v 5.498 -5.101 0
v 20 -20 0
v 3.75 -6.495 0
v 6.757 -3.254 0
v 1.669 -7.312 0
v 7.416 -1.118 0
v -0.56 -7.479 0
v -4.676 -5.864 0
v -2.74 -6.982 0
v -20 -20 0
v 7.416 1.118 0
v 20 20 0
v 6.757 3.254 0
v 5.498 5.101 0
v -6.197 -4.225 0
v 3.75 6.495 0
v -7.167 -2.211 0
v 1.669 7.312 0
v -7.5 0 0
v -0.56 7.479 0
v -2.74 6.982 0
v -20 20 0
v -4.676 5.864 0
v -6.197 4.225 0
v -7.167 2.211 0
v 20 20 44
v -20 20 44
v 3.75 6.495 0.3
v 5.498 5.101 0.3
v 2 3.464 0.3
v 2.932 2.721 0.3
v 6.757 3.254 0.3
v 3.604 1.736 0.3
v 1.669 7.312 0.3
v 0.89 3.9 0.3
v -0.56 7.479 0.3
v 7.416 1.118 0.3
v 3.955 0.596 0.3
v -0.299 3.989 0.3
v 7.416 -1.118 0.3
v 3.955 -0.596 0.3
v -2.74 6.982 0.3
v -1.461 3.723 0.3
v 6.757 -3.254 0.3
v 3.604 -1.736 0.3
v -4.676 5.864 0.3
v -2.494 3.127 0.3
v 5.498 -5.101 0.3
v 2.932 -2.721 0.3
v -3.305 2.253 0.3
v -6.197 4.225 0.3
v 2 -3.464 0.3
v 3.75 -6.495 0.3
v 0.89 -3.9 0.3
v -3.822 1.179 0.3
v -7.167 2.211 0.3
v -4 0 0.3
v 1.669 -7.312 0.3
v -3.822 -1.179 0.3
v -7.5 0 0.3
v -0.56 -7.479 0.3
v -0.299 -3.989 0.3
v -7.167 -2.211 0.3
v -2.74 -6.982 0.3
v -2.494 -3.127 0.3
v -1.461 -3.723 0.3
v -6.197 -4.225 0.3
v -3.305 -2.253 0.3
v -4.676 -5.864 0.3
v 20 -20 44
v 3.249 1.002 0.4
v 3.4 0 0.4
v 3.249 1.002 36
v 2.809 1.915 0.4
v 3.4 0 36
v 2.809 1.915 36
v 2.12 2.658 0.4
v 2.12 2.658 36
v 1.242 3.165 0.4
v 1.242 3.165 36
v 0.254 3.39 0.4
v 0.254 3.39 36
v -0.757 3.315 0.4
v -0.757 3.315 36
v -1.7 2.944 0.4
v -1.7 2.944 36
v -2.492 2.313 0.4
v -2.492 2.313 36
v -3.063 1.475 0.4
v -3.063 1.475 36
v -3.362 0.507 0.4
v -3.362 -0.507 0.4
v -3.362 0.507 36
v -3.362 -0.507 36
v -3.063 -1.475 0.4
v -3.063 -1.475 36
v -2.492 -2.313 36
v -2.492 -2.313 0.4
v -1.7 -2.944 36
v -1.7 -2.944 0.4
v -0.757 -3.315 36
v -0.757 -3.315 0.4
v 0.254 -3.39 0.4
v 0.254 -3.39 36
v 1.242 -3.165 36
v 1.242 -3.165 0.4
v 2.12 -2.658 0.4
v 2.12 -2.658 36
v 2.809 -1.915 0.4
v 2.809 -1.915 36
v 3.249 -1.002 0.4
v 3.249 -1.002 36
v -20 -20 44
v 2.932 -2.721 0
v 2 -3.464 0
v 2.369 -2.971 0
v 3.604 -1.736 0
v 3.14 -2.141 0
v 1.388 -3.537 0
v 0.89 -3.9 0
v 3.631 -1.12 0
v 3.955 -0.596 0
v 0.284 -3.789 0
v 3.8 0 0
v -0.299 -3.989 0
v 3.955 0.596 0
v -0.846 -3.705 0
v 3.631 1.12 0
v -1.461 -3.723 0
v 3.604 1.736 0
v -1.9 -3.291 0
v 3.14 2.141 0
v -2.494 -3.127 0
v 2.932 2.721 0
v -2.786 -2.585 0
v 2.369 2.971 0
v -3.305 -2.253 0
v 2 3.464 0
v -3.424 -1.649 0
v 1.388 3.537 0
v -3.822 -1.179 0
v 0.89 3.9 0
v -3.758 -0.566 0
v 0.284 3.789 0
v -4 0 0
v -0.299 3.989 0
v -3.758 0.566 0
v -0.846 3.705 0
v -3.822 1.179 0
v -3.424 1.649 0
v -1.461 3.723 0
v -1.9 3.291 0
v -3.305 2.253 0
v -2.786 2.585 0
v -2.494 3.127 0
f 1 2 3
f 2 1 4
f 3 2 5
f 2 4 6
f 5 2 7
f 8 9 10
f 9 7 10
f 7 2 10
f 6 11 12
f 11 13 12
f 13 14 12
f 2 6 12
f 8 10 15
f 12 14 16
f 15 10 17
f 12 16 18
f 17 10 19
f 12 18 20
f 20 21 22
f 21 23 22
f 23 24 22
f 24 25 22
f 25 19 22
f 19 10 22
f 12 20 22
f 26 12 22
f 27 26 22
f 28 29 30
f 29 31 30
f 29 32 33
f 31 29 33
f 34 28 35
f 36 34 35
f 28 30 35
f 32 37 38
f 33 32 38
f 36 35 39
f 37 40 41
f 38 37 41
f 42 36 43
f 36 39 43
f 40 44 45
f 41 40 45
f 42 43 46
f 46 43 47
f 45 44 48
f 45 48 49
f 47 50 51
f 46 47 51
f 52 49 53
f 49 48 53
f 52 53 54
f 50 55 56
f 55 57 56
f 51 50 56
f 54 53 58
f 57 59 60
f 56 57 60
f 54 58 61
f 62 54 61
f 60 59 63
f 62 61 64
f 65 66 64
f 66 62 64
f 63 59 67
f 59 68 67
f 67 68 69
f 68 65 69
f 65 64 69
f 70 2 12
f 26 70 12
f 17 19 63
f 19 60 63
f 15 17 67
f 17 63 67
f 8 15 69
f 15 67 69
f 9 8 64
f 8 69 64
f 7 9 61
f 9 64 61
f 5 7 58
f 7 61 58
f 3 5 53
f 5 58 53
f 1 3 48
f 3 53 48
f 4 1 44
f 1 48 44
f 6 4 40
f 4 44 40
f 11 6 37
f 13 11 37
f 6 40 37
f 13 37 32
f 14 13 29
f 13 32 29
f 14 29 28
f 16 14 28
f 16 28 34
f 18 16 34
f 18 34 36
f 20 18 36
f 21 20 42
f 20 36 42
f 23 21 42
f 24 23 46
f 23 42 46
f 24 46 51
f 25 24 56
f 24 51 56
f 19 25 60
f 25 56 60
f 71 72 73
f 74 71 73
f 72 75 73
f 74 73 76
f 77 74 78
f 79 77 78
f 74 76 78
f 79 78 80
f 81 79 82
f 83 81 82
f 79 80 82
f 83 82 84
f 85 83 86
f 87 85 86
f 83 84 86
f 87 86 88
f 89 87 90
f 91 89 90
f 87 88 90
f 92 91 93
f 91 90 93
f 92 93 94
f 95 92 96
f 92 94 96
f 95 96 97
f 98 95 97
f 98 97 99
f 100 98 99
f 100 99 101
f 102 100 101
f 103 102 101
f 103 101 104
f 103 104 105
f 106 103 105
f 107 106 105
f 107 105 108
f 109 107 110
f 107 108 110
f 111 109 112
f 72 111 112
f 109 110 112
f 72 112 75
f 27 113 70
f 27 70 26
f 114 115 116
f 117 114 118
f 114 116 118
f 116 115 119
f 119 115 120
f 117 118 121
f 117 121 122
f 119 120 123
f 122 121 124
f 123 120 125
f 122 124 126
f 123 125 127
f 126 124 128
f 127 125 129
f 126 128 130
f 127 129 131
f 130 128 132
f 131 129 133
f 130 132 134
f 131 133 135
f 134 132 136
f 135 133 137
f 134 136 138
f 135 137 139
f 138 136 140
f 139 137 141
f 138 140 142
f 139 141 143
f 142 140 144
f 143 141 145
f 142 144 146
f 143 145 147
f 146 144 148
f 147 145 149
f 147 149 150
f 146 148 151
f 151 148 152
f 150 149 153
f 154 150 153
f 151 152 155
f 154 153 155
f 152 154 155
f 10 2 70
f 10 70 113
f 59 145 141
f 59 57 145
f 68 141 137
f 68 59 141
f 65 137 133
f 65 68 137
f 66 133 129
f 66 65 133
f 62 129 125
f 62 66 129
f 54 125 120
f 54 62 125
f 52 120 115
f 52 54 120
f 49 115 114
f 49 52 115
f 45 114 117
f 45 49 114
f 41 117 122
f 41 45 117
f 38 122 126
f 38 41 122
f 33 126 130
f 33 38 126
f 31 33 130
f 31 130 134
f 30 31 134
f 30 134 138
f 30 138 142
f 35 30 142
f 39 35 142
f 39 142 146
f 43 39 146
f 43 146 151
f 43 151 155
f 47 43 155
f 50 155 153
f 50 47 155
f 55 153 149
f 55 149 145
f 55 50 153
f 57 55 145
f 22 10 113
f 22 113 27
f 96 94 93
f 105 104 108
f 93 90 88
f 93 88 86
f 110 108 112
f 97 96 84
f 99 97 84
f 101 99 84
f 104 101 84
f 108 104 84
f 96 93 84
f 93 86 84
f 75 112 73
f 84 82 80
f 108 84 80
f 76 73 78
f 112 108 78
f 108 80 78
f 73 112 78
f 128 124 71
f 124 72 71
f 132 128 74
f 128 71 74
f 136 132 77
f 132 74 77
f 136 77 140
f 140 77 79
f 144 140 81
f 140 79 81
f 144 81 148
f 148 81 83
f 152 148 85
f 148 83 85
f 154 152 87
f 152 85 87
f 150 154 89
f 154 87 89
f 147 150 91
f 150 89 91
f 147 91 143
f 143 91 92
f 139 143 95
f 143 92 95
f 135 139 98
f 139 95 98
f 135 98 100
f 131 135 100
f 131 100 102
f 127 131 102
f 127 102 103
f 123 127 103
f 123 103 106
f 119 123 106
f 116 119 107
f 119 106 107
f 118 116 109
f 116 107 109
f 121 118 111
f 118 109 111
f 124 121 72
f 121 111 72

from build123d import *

# Parameters (mm, degrees)
SKETCH1_W   = 40
SKETCH1_H   = 40
BLOCK_DEPTH = 44
SKETCH4_W   = 3.5
SKETCH4_H   = 0.8


with BuildPart() as part:
    # Sketch1 → Block (new body)
    with BuildSketch(Plane(origin=(0, 0, 0), x_dir=(0, 1, 0), z_dir=(0, 0, 1))):
        Rectangle(SKETCH1_W, SKETCH1_H)
    extrude(amount=BLOCK_DEPTH)

    # Sketch2 → Hole (revolve, cut)
    with BuildSketch(Plane(origin=(0, 0, 0), x_dir=(-1, 0, 0), z_dir=(0, 1, 0))):
        Polygon((0, -0.5), (-4.3, -0.5), (-3.8, 0), (-3.4, 0.4), (-3.4, 36), (0, 36), align=None)
    revolve(axis=Axis((0, 0, -200), (0, 0, 1)), mode=Mode.SUBTRACT)

    # Sketch4 → InsertGroove (revolve, cut)
    with BuildSketch(Plane(origin=(0, 0, 0), x_dir=(-1, 0, 0), z_dir=(0, 1, 0))):
        with Locations((-5.75, -0.1)):
            Rectangle(SKETCH4_W, SKETCH4_H)
    revolve(axis=Axis((0, 0, -200), (0, 0, 1)), mode=Mode.SUBTRACT)


solid = part.part
